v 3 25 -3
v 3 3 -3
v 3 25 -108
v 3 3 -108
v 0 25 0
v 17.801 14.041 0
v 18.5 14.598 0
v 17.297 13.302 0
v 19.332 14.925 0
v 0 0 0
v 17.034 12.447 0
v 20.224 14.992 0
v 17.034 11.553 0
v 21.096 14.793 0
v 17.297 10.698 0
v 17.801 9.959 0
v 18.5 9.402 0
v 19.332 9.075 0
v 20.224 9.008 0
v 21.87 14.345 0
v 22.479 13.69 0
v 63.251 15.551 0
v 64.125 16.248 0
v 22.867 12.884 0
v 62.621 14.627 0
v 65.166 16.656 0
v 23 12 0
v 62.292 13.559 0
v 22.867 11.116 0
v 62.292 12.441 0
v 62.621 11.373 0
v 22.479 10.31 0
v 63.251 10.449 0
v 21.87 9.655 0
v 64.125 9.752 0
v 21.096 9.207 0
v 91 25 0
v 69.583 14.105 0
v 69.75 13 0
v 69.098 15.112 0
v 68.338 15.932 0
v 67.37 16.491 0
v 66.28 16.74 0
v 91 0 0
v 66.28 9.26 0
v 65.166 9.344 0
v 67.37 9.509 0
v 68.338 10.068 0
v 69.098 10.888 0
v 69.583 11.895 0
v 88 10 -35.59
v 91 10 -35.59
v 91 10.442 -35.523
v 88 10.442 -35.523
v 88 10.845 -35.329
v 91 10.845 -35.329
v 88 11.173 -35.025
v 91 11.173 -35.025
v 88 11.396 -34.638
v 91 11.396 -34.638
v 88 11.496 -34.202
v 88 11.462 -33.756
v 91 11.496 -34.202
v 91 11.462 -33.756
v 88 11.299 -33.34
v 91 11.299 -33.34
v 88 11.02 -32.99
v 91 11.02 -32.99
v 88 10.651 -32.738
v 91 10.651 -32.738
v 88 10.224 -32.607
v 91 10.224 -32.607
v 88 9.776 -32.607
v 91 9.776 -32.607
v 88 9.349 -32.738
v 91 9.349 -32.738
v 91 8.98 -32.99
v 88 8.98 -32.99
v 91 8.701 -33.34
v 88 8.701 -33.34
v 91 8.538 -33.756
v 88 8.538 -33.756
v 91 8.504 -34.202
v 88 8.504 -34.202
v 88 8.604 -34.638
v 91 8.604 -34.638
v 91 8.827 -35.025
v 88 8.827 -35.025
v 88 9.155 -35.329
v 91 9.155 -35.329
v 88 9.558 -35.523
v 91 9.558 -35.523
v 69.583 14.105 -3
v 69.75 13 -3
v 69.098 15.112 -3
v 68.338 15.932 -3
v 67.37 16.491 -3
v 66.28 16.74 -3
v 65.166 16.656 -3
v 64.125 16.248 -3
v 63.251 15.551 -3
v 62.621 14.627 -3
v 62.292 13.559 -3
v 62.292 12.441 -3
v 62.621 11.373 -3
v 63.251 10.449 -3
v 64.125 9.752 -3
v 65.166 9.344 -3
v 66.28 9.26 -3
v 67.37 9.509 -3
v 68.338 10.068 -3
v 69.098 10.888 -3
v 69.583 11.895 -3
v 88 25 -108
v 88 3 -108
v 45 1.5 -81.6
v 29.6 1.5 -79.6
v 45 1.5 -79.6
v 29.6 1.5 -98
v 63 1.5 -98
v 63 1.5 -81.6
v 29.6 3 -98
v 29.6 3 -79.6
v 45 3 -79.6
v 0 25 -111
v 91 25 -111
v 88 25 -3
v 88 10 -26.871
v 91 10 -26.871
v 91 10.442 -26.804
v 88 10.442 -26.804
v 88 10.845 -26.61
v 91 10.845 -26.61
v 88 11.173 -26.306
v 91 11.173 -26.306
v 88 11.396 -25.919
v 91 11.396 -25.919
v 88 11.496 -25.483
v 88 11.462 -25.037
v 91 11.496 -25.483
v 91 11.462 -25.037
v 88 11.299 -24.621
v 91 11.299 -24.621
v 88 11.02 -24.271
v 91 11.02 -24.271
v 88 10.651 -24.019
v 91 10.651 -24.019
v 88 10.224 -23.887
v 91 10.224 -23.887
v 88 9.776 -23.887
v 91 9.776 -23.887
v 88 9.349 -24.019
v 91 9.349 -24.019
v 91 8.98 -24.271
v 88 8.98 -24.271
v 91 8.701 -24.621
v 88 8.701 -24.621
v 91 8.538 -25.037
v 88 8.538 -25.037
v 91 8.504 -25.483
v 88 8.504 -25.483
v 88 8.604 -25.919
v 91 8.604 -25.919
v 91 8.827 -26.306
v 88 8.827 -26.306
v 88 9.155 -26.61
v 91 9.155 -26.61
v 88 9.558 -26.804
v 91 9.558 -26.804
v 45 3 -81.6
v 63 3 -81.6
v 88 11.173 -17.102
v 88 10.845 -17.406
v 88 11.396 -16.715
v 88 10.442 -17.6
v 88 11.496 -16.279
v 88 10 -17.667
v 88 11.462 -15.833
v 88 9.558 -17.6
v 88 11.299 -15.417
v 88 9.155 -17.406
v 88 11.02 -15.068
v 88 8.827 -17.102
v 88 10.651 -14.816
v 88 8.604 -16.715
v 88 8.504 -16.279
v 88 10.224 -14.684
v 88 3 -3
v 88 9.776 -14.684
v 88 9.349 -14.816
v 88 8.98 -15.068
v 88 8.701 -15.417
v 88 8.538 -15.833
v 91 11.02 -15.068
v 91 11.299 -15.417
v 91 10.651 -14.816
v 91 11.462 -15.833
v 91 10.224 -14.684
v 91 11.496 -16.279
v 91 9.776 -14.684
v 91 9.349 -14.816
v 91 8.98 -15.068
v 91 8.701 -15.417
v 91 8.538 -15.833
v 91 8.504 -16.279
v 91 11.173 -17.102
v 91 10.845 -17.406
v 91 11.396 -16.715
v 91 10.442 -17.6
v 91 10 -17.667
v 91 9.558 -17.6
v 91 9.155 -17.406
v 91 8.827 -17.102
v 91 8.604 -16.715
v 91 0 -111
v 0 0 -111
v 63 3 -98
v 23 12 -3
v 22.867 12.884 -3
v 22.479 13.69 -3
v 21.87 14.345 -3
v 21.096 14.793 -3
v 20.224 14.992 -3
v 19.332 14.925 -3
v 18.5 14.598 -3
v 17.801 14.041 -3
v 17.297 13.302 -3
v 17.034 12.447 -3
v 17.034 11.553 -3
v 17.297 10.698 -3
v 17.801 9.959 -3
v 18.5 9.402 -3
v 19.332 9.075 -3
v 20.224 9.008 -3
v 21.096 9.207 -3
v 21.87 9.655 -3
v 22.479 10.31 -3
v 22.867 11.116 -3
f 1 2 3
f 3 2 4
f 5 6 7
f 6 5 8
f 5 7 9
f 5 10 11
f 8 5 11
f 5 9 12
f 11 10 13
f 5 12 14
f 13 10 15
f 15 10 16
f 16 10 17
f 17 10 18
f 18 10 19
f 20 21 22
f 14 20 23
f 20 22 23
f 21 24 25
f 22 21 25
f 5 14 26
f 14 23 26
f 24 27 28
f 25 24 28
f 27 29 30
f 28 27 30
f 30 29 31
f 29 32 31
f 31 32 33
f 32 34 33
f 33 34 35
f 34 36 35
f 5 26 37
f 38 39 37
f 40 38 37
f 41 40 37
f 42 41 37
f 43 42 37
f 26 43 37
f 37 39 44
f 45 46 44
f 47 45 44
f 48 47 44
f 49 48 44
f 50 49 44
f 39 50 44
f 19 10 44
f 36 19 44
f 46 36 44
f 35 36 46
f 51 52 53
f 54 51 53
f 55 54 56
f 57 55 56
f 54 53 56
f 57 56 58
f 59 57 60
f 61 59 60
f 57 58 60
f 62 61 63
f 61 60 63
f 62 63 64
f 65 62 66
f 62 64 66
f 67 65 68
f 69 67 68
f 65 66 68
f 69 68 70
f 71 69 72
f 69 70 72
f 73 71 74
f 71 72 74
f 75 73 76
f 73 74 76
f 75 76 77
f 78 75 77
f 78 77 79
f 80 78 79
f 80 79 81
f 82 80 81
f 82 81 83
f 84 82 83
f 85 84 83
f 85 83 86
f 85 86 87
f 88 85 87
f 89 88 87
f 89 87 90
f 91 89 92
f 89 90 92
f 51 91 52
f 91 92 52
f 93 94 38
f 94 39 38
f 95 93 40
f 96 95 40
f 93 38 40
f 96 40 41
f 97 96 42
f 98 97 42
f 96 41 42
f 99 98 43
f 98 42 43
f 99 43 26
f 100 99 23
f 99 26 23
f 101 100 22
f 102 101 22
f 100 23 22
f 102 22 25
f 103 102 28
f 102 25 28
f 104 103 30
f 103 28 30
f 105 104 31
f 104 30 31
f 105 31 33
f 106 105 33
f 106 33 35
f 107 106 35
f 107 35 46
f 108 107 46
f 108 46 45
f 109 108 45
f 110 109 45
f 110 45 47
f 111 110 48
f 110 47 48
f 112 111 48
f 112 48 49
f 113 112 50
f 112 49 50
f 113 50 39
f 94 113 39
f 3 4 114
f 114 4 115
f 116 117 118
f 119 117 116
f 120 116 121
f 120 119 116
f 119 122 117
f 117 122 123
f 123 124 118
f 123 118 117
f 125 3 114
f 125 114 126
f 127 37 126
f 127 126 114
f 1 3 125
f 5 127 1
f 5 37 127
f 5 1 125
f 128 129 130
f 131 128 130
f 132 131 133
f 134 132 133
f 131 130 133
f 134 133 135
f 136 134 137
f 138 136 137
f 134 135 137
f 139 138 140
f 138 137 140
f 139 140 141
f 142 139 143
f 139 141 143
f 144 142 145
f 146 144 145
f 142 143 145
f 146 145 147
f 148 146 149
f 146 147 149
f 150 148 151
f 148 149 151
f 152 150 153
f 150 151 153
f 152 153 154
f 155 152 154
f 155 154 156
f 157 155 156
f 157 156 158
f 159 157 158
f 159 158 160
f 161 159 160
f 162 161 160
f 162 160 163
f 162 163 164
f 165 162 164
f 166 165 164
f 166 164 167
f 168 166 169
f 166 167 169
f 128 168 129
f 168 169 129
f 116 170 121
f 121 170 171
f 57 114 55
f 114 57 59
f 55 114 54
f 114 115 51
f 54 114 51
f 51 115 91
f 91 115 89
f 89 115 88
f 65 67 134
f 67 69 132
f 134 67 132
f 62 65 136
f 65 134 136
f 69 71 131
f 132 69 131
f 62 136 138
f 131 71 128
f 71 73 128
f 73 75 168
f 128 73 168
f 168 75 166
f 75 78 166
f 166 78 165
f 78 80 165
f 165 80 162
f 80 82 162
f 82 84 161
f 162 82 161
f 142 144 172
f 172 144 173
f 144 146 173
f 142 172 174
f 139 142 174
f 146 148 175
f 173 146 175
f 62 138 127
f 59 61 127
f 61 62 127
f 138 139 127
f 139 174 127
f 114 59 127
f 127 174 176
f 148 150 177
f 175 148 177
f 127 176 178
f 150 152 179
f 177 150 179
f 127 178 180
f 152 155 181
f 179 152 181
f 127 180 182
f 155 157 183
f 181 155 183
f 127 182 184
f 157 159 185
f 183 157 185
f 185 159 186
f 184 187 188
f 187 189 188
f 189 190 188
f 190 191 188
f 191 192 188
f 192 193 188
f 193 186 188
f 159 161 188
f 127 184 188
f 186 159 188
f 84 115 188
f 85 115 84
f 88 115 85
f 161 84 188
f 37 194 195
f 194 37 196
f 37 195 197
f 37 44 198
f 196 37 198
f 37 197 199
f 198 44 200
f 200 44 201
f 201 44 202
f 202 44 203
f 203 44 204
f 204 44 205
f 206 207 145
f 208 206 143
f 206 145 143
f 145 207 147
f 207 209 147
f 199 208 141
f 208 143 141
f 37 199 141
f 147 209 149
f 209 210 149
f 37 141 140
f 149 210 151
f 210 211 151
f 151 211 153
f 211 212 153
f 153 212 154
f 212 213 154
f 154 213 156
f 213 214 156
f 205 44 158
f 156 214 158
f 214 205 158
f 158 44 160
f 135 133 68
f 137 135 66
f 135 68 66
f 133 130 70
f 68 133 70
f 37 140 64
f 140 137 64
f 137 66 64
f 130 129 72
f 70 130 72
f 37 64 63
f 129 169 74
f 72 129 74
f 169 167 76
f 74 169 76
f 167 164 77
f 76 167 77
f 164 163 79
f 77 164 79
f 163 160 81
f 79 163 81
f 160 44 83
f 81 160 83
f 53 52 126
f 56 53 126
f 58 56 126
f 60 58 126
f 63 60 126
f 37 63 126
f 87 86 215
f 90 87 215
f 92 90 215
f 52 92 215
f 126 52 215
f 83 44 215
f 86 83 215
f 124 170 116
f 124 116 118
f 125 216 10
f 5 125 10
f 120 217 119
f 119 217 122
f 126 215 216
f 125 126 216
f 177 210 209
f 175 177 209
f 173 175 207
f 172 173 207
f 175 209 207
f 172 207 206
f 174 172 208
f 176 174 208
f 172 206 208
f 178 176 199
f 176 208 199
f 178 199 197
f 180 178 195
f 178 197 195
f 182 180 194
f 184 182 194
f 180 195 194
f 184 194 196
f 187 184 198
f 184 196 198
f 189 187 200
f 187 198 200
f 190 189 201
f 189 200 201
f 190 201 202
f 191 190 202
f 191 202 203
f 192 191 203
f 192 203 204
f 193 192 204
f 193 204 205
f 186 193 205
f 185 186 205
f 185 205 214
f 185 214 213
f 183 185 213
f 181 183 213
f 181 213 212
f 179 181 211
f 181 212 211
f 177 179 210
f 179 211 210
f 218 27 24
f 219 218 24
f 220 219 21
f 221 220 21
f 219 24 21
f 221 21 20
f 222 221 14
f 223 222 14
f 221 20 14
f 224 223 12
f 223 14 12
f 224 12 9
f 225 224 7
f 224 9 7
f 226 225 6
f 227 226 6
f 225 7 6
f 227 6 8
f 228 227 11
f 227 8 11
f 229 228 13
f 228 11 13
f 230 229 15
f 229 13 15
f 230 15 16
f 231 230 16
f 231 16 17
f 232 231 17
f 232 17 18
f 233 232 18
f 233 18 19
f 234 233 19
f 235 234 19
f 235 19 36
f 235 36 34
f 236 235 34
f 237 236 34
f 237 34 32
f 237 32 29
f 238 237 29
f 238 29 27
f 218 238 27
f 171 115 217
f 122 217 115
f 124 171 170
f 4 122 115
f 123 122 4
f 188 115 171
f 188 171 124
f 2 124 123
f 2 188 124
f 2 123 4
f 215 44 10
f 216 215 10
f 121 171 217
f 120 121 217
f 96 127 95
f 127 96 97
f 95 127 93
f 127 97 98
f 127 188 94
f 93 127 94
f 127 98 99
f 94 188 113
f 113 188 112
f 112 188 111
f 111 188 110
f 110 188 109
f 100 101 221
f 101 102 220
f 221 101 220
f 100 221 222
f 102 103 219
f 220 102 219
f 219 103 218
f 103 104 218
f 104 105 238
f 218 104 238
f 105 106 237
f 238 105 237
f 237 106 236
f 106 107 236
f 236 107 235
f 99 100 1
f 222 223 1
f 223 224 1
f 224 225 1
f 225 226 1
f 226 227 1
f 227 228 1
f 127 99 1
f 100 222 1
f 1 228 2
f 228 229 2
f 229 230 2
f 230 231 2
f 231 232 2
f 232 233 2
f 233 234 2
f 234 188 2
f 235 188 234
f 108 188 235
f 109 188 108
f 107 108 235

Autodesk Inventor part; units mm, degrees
ref_plane "YZ Plane" through (0, 0, 0) normal (1, 0, 0) x (0, 1, 0)
ref_plane "XZ Plane" through (0, 0, 0) normal (0, 1, 0) x (-1, 0, 0)
ref_plane "XY Plane" through (0, 0, 0) normal (0, 0, 1) x (1, 0, 0)
sketch "Esboço1" plane through (0, 0, 0) normal (0, 1, 0) x (-1, 0, 0)
  line L0 (0, 0) -> (-91, 0)
  line L1 (-91, 0) -> (-91, -111)
  line L2 (-91, -111) -> (0, -111)
  line L3 (0, -111) -> (0, 0)
  line L4 (-3, -108) -> (-88, -108)
  line L5 (-88, -108) -> (-88, -3)
  line L6 (-88, -3) -> (-3, -3)
  line L7 (-3, -3) -> (-3, -108)
  dimension "d0" = 3
  dimension "d1" = 3
  dimension "d2" = 3
  dimension "d3" = 3
  dimension "d4" = 85
  dimension "d5" = 105
extrude "Extrusão1" add sketch "Esboço1" along normal blind 3 contours L4 L5 L6 L7
extrude "Extrusão2" add sketch "Esboço1" along normal blind 25
sketch "Esboço2" plane through (0, 0, 0) normal (0, 0, 1) x (1, 0, 0)
  circle A0 centre (20, 12) radius 3
  circle A1 centre (66, 13) radius 3.75
  line L0 (0, 0) -> (0, 25) projected
  line L1 (91, 0) -> (91, 25) projected
  line L2 (0, 0) -> (91, 0) projected
  point P0 (0, 12.5)
  dimension "d10" = 6
  dimension "d11" = 7.5
  dimension "d25" = 20
  dimension "d26" = 25
  dimension "d30" = 13
  dimension "d31" = 12
extrude "Extrusão3" cut sketch "Esboço2" against normal blind 30
sketch "Esboço3" plane through (91, 0, 0) normal (1, 0, 0) x (0, 0, -1)
  circle A0 centre (16.1671, 10) radius 1.5
  circle A1 centre (34.0898, 10) radius 1.5
  circle A2 centre (25.3707, 10) radius 1.5
  line L0 (0, 0) -> (111, 0) projected
  dimension "d14" = 3
  dimension "d15" = 3
  dimension "d16" = 3
  dimension "d32" = 10
  dimension "d33" = 10
  dimension "d34" = 10
extrude "Extrusão4" cut sketch "Esboço3" against normal blind 10
sketch "Esboço4" plane through (0, 3, 0) normal (0, 1, 0) x (1, 0, 0)
  line L0 (29.6, 81.6) -> (63, 81.6)
  line L1 (63, 81.6) -> (63, 98)
  line L2 (63, 98) -> (29.6, 98)
  line L3 (29.6, 98) -> (29.6, 81.6)
  line L4 (88, 108) -> (88, 3) projected
  line L5 (3, 108) -> (88, 108) projected
  line L6 (29.6, 81.6) -> (45, 81.6)
  line L7 (45, 81.6) -> (45, 79.6)
  line L8 (45, 79.6) -> (29.6, 79.6)
  line L9 (29.6, 79.6) -> (29.6, 81.6)
  point P0 (0, 0)
  point P1 (63, 89.8)
  dimension "d19" = 33.4
  dimension "d20" = 16.4
  dimension "d23" = 25
  dimension "d24" = 10
  dimension "d35" = 18.4
  dimension "d36" = 15.4
extrude "Extrusão5" cut sketch "Esboço4" against normal blind 1.5
properties part number "Caixa_3DPrint"
